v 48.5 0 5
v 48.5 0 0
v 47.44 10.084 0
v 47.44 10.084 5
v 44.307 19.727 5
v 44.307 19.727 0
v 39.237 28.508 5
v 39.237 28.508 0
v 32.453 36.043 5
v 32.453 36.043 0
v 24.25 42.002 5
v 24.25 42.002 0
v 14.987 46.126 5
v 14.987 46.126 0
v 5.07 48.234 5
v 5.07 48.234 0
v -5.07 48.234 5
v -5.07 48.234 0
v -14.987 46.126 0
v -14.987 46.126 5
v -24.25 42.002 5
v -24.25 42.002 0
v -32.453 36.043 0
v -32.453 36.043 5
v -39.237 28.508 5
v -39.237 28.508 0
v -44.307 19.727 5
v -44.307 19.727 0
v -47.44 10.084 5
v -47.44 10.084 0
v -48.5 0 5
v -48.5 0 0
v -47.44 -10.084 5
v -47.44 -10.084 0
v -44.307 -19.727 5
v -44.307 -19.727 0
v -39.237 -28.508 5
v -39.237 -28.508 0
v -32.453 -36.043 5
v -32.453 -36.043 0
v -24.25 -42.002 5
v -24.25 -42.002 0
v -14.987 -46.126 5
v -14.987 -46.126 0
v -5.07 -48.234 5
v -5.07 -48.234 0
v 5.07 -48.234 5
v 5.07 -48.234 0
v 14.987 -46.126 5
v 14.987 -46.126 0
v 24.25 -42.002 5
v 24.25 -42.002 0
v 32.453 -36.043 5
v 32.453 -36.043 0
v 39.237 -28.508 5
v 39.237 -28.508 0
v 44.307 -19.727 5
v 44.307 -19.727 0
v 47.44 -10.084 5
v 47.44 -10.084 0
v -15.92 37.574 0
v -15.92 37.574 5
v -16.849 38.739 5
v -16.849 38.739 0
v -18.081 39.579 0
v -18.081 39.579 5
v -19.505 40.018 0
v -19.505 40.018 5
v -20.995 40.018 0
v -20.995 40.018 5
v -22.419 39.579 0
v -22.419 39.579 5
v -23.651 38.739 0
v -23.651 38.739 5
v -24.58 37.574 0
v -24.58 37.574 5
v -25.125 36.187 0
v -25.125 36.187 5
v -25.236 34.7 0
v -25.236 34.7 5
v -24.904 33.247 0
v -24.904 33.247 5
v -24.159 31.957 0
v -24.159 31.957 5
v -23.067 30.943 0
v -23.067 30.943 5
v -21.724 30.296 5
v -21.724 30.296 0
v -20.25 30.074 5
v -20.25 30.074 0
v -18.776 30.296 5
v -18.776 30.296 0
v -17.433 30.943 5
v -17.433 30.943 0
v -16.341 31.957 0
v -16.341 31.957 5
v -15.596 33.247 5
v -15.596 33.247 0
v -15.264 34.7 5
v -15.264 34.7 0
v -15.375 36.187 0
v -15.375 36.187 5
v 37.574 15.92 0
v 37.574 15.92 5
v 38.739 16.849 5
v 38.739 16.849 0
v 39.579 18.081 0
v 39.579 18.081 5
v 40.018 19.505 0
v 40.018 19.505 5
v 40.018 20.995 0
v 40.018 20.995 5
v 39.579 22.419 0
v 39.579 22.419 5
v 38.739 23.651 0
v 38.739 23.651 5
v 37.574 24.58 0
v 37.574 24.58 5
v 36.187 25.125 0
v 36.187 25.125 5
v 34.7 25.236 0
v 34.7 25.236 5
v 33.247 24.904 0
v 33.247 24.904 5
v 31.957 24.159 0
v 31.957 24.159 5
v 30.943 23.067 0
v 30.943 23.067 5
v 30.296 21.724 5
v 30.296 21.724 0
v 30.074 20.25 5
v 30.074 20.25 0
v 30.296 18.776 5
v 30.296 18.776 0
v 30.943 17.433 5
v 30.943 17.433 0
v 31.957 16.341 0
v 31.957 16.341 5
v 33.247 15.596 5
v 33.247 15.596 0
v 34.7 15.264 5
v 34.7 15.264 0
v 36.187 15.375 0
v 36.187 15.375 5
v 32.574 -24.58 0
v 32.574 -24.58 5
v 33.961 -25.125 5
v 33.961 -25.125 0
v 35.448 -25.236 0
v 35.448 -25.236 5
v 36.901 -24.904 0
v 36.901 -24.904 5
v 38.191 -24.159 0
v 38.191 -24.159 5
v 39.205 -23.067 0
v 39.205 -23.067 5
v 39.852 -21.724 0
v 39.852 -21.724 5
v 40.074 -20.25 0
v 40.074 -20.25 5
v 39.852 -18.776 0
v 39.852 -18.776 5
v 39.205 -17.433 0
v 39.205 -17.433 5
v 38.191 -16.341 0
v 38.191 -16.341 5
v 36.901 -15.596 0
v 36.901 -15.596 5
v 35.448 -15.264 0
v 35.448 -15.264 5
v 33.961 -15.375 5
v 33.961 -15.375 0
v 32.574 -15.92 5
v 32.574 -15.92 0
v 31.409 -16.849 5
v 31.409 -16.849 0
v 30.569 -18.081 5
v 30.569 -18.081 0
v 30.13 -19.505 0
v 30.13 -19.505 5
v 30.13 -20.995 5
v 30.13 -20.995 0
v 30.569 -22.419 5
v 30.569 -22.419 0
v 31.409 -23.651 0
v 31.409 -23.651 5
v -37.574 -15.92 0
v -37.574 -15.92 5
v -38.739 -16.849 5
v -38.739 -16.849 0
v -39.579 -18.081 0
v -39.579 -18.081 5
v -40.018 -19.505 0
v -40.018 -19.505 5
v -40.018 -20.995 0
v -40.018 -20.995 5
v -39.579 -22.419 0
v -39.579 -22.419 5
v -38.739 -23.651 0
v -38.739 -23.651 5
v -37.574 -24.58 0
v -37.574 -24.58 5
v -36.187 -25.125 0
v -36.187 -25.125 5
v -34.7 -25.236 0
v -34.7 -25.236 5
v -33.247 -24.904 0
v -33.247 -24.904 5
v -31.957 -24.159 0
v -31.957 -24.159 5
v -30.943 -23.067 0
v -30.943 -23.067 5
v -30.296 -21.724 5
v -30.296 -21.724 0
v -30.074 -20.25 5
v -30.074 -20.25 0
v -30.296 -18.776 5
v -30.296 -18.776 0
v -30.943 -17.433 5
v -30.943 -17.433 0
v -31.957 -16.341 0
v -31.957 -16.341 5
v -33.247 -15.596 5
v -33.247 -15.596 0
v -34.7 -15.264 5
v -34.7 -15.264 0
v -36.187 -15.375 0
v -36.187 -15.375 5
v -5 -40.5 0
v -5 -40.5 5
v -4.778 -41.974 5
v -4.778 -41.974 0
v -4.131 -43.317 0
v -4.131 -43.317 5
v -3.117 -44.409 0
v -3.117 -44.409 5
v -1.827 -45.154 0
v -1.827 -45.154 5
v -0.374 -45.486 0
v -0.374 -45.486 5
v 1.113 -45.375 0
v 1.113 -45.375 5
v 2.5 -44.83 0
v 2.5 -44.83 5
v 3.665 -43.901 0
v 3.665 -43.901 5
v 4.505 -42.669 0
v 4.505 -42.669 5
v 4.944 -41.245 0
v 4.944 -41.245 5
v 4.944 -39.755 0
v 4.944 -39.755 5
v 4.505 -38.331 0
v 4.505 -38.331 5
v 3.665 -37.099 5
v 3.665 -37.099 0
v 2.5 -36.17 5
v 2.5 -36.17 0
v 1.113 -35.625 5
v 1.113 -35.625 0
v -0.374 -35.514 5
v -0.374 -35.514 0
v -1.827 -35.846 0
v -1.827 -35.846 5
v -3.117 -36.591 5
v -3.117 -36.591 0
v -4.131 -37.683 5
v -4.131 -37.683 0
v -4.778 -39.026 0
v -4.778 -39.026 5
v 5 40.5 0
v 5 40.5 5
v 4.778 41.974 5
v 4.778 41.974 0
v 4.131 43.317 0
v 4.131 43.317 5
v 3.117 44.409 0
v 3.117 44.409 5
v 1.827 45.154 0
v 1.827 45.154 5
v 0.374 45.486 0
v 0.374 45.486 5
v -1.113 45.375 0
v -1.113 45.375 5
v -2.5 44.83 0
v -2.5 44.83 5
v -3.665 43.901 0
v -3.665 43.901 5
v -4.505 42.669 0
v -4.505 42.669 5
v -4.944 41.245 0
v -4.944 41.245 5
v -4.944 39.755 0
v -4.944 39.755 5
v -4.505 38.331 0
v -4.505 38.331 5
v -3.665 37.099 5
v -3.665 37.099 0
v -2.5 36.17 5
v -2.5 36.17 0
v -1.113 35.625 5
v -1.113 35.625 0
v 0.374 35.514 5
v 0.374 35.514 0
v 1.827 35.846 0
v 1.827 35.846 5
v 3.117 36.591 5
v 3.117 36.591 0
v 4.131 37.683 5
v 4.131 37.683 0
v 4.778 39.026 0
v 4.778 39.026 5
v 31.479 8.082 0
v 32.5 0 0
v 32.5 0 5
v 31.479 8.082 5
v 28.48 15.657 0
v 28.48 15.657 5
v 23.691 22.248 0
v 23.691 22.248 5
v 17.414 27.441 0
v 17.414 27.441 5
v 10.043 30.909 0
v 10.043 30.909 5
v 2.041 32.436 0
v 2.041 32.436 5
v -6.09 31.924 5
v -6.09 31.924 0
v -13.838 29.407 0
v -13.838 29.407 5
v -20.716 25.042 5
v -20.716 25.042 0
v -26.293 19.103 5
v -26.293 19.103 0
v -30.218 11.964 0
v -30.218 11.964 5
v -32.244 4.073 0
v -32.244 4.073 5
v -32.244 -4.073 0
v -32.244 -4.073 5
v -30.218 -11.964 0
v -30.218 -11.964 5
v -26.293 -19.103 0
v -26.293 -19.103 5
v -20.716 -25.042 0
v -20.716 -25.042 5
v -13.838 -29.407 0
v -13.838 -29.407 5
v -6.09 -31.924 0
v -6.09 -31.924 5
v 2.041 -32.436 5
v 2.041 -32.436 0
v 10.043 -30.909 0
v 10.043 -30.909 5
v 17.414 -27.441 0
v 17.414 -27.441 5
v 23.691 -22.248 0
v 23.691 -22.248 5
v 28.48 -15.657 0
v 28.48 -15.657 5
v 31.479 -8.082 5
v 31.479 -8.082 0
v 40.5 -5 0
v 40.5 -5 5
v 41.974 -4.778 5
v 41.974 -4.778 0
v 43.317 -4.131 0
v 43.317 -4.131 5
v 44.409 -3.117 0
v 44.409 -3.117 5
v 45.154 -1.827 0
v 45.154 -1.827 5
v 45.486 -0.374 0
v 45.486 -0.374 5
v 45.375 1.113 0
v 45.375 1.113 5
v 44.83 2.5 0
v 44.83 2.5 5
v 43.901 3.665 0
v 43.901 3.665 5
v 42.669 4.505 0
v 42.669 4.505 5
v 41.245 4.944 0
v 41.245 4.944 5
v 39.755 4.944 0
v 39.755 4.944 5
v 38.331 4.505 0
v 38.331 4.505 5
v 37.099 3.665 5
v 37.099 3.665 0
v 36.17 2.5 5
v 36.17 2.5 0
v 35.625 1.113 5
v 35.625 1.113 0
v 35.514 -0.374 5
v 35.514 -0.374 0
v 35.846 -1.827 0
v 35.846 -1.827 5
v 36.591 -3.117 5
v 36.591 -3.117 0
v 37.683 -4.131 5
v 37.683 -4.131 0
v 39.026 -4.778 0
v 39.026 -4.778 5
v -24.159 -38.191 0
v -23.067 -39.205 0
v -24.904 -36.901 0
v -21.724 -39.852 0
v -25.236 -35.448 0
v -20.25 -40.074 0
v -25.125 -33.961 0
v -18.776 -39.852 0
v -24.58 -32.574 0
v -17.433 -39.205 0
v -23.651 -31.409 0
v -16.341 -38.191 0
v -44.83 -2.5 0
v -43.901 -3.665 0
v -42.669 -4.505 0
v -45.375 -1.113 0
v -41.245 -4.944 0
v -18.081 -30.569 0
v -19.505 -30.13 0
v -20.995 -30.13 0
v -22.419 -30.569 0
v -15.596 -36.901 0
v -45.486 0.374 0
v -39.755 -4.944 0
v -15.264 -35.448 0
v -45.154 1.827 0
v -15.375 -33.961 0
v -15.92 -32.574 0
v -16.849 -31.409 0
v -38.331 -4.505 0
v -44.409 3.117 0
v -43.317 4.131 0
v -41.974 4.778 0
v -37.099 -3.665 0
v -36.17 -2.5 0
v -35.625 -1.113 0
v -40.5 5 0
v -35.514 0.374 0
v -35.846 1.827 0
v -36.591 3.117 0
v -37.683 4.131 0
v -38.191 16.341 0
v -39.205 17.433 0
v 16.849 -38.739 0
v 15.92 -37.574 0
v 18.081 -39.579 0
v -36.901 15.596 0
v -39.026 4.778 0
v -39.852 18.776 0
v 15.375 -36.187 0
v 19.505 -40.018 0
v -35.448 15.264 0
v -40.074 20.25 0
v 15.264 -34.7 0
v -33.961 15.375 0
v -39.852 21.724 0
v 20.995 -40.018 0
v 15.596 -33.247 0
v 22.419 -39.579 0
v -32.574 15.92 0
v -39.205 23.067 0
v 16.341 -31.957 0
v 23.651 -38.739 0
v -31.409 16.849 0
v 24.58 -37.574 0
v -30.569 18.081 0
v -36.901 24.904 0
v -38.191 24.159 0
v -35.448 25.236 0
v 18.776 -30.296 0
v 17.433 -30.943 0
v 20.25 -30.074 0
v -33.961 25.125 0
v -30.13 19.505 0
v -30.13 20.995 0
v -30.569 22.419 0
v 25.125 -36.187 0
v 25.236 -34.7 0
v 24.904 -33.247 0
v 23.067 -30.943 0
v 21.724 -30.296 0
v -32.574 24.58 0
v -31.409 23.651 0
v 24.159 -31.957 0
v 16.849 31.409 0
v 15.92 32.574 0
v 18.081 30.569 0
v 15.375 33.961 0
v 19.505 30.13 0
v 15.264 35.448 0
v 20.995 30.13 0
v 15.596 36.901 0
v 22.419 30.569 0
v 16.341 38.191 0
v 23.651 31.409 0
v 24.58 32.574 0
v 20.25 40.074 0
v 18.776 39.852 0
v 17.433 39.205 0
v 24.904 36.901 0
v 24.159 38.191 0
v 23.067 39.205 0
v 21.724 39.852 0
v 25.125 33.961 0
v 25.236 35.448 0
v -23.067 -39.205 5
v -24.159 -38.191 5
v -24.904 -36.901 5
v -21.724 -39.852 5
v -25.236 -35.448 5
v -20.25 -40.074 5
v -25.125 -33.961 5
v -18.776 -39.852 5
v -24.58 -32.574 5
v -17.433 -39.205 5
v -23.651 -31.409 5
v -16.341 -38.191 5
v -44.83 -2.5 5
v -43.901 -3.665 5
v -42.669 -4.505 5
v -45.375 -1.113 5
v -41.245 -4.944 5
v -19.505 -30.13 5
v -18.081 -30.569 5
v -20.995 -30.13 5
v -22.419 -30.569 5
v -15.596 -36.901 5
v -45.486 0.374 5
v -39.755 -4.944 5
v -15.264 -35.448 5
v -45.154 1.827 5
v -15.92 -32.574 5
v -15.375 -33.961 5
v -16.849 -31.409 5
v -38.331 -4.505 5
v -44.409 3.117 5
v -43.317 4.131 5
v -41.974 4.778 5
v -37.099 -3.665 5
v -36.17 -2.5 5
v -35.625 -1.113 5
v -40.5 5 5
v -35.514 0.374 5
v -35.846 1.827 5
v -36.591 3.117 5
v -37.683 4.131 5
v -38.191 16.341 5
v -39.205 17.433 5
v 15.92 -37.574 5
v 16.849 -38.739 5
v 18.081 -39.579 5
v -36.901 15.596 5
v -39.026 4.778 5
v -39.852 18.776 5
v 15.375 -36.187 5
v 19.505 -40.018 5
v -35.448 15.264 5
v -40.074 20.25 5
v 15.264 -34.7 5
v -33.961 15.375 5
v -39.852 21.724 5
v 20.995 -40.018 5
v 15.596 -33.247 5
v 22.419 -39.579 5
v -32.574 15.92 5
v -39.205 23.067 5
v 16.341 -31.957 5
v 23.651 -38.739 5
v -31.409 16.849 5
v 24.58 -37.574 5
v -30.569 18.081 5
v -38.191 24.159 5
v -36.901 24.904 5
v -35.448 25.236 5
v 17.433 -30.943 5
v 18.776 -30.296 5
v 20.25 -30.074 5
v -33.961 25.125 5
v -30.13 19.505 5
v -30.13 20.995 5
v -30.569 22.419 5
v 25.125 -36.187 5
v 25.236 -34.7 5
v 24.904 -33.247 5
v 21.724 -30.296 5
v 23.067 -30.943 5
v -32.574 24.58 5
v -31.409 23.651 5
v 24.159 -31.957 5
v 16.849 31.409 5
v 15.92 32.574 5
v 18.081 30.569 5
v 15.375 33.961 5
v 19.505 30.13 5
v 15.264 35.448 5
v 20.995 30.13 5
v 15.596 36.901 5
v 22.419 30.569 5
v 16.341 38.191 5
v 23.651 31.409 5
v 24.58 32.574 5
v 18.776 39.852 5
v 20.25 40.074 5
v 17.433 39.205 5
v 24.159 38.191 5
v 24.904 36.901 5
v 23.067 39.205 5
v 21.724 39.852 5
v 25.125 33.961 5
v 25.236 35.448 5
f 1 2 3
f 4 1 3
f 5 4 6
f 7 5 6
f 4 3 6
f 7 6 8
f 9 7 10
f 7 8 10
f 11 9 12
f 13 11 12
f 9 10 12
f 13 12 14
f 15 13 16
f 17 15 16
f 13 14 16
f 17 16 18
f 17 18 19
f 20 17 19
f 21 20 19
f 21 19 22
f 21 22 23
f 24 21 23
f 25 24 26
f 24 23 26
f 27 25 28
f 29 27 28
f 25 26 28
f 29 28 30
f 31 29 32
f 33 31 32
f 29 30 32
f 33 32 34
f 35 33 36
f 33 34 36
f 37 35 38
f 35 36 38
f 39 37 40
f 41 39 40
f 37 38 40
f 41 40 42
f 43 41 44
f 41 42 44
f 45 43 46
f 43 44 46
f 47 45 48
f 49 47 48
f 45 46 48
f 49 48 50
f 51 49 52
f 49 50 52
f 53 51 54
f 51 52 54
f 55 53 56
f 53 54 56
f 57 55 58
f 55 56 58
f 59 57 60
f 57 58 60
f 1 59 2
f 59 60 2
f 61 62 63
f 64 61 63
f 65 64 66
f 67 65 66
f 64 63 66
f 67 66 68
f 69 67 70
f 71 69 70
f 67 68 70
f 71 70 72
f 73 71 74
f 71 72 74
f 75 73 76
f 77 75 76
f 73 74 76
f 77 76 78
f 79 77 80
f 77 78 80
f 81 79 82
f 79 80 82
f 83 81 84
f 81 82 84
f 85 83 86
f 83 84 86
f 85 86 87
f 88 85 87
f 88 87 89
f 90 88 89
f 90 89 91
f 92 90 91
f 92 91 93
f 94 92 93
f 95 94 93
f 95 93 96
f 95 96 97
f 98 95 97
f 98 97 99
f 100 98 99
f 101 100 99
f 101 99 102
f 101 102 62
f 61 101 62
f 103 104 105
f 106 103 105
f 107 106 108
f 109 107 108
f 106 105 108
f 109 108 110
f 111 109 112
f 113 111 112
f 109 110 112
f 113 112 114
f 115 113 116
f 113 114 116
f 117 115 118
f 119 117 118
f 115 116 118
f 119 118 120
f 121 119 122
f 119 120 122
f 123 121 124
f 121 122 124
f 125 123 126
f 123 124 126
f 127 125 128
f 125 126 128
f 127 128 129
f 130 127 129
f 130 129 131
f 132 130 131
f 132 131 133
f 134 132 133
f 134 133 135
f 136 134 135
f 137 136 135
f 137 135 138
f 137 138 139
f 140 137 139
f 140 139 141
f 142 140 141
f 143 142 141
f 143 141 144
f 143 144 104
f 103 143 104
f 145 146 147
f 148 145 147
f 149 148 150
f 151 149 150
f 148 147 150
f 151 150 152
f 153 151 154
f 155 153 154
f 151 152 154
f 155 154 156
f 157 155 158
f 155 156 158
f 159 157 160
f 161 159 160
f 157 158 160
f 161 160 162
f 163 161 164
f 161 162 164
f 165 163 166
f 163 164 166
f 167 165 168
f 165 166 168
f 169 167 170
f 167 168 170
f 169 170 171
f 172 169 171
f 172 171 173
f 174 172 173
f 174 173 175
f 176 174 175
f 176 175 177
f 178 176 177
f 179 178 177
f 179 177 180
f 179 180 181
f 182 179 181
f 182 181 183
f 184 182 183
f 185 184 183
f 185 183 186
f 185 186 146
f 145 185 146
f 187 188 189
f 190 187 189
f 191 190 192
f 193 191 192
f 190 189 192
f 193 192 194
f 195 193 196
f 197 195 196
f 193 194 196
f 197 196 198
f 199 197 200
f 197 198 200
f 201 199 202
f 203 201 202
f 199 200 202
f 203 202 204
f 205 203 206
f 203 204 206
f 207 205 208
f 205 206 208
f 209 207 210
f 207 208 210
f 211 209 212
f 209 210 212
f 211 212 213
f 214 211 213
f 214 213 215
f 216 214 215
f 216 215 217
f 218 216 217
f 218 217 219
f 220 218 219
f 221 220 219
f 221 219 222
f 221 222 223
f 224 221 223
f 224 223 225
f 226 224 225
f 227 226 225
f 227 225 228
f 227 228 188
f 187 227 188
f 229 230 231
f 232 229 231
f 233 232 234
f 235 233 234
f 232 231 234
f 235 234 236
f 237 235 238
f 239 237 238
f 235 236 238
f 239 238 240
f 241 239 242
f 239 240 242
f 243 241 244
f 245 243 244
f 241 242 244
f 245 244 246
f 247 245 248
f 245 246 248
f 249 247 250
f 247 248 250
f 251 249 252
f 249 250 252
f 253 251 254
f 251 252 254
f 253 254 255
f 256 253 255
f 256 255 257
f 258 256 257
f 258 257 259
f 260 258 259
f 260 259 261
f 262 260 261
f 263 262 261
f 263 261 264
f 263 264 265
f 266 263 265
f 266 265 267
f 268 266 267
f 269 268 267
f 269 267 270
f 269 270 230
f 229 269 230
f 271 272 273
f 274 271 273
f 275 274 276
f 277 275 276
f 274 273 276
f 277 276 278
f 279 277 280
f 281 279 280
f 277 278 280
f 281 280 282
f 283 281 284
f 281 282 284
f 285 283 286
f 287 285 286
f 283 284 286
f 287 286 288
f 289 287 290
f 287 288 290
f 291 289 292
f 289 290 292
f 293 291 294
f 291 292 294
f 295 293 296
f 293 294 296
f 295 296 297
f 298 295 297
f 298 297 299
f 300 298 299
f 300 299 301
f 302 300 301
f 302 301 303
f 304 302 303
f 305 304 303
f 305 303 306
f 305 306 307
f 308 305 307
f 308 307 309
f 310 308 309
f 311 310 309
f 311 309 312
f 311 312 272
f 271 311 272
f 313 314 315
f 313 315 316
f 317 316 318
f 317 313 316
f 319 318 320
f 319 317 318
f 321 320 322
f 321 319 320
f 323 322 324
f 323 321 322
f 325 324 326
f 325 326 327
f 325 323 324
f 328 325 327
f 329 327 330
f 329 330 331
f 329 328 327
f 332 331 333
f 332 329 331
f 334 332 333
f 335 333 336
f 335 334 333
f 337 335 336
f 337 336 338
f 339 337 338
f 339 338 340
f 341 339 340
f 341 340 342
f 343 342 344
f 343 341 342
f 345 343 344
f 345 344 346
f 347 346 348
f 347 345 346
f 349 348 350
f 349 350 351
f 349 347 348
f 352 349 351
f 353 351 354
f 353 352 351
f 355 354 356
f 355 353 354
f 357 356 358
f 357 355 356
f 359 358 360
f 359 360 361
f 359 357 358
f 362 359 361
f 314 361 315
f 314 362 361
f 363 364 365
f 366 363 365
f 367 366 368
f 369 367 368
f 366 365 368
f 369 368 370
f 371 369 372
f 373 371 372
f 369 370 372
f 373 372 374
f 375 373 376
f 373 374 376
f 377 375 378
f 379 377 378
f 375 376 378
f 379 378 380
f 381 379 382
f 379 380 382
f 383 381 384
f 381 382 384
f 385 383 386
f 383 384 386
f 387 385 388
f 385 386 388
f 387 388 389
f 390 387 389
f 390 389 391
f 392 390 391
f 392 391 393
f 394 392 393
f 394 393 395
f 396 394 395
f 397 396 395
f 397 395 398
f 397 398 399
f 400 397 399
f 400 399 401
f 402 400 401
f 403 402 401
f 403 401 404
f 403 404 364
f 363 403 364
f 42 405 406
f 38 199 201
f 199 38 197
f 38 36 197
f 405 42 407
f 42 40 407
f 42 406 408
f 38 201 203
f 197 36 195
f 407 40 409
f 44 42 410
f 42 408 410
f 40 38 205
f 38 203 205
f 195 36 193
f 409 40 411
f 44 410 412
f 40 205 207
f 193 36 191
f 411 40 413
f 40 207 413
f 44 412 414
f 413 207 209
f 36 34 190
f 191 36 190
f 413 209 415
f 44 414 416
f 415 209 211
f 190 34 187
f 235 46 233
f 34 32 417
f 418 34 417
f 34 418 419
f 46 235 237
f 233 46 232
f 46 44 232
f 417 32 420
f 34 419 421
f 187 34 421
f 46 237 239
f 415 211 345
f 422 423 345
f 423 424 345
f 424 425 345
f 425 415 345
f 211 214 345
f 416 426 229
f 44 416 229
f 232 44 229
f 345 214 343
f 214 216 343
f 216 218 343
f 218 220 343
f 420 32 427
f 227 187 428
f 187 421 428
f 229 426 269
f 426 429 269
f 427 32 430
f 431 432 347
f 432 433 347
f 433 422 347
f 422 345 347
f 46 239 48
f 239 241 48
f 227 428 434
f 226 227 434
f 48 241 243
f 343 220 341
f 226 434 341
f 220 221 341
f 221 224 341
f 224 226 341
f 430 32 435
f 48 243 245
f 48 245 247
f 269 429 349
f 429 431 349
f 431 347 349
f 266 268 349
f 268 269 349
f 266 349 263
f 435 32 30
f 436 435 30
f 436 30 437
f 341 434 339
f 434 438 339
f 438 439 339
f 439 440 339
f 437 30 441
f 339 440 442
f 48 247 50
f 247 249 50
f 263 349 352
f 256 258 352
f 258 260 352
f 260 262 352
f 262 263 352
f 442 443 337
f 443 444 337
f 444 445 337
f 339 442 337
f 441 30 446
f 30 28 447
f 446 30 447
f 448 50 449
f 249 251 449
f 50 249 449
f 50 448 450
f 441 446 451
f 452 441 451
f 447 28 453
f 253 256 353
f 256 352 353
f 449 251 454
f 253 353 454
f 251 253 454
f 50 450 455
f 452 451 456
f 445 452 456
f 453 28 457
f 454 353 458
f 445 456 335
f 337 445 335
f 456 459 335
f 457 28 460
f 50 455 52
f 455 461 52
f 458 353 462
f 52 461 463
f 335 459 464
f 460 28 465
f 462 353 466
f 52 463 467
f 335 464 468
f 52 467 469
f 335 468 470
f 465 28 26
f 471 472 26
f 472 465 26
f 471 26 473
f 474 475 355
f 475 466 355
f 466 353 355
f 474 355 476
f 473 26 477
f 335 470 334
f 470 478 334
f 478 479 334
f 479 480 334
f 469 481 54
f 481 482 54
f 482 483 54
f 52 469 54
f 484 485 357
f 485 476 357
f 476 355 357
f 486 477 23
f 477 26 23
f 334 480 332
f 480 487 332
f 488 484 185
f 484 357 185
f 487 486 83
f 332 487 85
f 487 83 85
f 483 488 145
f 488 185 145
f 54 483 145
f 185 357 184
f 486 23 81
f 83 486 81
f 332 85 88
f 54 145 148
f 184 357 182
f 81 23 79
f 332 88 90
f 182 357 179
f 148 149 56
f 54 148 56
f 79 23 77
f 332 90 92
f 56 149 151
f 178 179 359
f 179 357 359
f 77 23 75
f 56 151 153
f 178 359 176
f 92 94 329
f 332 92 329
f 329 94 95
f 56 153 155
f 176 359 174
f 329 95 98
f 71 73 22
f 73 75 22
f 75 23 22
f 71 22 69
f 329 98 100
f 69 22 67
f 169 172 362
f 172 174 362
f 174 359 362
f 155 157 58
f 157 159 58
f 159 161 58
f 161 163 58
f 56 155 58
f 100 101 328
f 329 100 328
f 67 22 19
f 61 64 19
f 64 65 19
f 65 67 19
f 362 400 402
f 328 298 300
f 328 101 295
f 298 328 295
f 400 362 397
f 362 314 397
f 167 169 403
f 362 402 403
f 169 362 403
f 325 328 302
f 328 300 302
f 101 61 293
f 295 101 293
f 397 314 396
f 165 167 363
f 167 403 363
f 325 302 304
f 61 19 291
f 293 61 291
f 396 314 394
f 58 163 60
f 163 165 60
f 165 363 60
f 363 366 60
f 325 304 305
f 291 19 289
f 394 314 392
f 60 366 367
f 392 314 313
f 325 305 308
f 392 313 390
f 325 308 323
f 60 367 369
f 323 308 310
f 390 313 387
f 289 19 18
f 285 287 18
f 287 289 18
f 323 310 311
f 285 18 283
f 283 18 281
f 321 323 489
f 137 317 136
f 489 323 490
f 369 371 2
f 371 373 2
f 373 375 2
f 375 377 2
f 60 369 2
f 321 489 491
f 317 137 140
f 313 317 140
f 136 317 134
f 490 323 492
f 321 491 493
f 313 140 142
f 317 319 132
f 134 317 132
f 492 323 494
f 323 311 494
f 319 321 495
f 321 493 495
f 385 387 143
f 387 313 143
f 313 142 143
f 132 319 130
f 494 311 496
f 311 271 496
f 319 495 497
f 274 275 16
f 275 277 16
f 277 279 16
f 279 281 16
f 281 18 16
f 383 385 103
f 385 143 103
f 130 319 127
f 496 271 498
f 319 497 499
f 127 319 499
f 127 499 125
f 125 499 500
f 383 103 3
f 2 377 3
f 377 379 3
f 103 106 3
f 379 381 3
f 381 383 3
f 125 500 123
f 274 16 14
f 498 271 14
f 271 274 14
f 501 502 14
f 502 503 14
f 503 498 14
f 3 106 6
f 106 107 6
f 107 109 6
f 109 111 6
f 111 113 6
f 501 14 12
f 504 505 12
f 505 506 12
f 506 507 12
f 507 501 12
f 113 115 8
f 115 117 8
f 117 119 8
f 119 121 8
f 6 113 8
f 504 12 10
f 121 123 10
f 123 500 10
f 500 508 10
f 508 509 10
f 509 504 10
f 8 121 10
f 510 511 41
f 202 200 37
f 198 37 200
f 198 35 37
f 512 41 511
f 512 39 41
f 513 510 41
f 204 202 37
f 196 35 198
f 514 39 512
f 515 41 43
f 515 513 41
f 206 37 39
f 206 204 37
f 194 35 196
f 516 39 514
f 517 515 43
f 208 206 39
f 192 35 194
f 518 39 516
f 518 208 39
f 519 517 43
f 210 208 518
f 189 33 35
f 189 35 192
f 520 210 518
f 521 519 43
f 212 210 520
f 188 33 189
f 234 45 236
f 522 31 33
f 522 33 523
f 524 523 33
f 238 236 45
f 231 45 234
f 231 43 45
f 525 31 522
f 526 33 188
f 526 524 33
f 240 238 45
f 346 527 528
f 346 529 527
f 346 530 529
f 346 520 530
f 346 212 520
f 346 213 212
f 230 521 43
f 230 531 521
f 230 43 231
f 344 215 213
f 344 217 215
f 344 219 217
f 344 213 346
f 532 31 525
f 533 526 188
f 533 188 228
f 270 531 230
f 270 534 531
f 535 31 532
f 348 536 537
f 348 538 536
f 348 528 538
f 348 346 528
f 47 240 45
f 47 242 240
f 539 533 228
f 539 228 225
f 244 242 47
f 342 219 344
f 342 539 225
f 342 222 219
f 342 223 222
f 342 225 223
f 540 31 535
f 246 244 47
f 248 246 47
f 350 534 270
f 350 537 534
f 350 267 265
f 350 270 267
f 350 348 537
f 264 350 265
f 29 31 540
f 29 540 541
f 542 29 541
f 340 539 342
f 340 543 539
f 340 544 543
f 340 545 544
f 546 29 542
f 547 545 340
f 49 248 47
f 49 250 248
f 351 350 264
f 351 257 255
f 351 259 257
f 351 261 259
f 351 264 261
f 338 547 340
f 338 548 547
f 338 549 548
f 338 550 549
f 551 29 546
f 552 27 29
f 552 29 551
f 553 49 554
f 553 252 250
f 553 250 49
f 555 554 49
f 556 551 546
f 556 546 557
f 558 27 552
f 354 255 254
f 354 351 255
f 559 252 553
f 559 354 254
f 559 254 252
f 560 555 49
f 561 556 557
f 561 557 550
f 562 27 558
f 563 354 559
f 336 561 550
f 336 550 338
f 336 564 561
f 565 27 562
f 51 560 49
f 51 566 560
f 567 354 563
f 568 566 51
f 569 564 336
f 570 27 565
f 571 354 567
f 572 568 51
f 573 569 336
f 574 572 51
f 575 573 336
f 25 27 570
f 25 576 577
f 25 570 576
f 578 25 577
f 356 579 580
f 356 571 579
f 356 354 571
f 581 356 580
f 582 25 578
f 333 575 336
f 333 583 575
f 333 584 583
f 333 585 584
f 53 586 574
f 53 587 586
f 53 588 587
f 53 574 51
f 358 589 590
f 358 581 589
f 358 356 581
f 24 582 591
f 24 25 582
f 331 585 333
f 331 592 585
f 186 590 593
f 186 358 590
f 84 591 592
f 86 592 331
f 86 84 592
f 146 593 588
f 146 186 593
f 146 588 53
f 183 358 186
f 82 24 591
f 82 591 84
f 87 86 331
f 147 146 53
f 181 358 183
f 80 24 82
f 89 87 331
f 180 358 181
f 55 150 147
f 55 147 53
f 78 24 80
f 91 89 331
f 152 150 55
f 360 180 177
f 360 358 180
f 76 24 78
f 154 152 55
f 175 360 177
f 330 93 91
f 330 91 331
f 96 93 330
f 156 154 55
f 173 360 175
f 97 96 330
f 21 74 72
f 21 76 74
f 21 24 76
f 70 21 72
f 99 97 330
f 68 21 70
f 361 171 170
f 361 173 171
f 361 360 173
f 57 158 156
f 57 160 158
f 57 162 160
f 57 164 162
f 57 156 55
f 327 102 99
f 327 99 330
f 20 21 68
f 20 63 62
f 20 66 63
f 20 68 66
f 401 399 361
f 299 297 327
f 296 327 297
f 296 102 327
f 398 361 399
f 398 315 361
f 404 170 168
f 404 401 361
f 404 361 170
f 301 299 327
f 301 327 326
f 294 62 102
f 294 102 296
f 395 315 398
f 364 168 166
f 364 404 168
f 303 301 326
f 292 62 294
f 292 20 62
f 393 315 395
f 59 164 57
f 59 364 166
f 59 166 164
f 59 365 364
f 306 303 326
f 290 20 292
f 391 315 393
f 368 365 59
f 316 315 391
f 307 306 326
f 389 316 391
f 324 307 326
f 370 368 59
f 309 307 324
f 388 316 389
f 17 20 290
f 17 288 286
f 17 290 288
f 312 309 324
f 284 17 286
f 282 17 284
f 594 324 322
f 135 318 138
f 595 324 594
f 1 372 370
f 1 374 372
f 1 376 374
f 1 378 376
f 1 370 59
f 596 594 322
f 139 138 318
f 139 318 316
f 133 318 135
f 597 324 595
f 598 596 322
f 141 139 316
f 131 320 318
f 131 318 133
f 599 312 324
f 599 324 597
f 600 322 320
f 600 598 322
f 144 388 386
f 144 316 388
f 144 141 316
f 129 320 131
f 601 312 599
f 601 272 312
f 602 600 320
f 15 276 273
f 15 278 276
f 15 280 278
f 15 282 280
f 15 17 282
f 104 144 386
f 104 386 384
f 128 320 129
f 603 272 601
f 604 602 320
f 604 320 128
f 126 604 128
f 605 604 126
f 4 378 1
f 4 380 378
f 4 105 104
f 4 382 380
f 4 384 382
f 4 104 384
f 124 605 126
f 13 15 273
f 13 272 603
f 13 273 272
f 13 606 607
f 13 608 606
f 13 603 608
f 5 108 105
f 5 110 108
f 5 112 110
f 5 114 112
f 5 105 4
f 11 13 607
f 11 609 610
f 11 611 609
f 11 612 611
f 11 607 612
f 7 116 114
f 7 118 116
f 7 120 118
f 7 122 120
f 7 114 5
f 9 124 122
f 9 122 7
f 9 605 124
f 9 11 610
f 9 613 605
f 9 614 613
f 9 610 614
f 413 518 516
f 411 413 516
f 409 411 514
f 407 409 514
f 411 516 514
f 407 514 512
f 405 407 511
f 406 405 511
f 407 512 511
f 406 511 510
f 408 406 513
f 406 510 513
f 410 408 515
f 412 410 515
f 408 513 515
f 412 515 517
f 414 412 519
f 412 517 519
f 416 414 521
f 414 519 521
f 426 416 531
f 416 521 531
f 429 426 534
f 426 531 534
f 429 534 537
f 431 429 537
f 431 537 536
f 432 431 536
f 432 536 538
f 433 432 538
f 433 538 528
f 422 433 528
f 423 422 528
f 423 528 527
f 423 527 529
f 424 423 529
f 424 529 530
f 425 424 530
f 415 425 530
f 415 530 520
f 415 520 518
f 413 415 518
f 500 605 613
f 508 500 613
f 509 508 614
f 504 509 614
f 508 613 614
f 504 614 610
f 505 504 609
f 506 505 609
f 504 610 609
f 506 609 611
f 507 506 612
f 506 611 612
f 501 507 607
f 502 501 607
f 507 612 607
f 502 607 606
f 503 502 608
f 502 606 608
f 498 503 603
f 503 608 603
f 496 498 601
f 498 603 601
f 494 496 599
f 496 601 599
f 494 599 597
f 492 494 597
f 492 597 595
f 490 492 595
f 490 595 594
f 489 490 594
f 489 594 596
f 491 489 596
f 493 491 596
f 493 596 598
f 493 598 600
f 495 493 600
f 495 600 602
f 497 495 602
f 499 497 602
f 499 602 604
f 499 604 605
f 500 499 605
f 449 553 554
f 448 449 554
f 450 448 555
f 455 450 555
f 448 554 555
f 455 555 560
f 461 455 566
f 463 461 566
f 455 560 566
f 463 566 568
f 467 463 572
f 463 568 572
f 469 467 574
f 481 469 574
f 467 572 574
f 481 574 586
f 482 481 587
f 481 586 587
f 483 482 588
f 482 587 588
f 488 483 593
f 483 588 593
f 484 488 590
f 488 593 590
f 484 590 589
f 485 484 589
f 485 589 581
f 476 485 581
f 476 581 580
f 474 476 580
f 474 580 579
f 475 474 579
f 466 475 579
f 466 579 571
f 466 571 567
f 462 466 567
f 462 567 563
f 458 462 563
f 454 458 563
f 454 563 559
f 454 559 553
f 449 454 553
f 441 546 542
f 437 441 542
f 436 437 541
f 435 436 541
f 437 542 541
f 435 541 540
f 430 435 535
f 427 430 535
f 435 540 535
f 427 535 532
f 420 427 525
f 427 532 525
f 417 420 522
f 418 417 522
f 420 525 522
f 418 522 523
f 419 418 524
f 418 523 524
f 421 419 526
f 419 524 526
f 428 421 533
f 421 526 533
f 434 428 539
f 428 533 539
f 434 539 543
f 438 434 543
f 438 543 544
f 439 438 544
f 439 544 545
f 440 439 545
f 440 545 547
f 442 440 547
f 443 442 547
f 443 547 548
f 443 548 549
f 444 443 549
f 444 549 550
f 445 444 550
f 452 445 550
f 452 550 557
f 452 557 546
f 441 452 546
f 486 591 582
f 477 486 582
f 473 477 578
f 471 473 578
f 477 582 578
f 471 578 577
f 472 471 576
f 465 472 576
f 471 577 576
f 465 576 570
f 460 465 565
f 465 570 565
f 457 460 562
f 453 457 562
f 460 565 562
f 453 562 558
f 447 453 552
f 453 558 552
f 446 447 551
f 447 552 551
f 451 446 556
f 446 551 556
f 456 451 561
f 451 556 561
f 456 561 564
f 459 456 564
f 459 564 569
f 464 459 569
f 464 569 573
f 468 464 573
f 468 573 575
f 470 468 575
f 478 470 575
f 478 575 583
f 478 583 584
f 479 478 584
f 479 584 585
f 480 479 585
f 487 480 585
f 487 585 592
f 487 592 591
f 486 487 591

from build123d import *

# Parameters (mm, degrees)
SKETCH1_R         = 48.5
SKETCH1_R_2       = 32.5
BODY_DEPTH        = 5
SKETCH2_R         = 5
BOLT_HOLE_DEPTH   = 69.771360318
CIRPATTERN1_COUNT = 12


with BuildPart() as part:
    # Sketch1 → Body (new body)
    with BuildSketch(Plane.XY):
        Circle(SKETCH1_R)
        Circle(SKETCH1_R_2, mode=Mode.SUBTRACT)
    extrude(amount=BODY_DEPTH)

    # Sketch2 → Bolt Hole (cut, through all)
    with BuildSketch(Plane.XY.offset(5)):
        with Locations((0, 40.5)):
            Circle(SKETCH2_R)
    bolt_hole = extrude(amount=-BOLT_HOLE_DEPTH, mode=Mode.SUBTRACT)

    # CirPattern1: Bolt Hole ×12 about axis
    cirpattern1_axis = Axis((0, 0, 0), (0, 0, 1))
    for i in range(1, CIRPATTERN1_COUNT):
        add(bolt_hole.rotate(cirpattern1_axis, i * 360 / CIRPATTERN1_COUNT), mode=Mode.SUBTRACT)


solid = part.part
